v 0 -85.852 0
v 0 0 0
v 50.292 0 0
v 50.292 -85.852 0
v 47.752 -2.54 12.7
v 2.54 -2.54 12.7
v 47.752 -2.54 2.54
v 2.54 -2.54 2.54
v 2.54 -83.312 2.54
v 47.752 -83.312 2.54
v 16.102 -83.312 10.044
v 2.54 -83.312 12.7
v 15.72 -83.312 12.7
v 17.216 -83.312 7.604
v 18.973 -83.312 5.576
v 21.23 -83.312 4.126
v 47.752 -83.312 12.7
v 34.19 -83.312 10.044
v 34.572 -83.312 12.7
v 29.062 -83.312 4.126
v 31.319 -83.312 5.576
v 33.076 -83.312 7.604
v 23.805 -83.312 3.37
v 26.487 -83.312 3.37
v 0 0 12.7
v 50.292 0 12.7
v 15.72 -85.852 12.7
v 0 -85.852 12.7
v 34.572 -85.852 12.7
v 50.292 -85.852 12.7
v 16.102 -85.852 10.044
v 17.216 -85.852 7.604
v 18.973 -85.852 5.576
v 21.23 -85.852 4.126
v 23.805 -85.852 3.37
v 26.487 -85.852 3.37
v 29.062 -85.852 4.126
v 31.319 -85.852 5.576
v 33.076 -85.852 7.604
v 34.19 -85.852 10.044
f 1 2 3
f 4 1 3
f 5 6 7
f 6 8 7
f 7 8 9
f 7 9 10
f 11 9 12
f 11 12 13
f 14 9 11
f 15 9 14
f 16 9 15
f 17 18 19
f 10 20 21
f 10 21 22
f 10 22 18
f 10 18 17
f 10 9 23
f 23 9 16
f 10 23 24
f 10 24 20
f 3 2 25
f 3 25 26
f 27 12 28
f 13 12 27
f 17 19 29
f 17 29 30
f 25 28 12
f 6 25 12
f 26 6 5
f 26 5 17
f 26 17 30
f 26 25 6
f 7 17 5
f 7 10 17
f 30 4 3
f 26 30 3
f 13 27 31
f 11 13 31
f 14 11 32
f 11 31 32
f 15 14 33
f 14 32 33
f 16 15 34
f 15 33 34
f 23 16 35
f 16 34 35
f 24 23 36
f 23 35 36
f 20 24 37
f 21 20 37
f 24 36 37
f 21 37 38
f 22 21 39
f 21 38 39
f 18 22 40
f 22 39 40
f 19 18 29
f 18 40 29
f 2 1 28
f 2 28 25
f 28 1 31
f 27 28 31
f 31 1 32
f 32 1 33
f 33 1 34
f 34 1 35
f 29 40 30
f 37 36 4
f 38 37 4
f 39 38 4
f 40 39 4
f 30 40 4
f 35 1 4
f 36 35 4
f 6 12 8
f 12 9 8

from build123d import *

# Parameters (mm, degrees)
F0_W     = 50.292
F0_H     = 85.852
F1_DEPTH = 12.7
F2_T     = -2.54
F4_DEPTH = 25.4


with BuildPart() as f1:
    # F0 (on Top) → F1 (new body)
    with BuildSketch(Plane.XY):
        with Locations((25.146, -42.926)):
            Rectangle(F0_W, F0_H)
    extrude(amount=F1_DEPTH)

    # F2
    f2_openings = [f1.faces().sort_by_distance(p)[0] for p in [
        (25.146, -42.926, 12.7),
    ]]
    offset(amount=F2_T, openings=f2_openings)

    # F3 (on face) → F4 (cut)
    with BuildSketch(Plane.XZ.offset(85.852)):
        with BuildLine():
            ThreePointArc((15.71989, 12.7), (25.146, 3.27389), (34.57211, 12.7))
            Line((34.57211, 12.7), (15.71989, 12.7))
        make_face()
    extrude(amount=-F4_DEPTH, mode=Mode.SUBTRACT)


solid = f1.part
